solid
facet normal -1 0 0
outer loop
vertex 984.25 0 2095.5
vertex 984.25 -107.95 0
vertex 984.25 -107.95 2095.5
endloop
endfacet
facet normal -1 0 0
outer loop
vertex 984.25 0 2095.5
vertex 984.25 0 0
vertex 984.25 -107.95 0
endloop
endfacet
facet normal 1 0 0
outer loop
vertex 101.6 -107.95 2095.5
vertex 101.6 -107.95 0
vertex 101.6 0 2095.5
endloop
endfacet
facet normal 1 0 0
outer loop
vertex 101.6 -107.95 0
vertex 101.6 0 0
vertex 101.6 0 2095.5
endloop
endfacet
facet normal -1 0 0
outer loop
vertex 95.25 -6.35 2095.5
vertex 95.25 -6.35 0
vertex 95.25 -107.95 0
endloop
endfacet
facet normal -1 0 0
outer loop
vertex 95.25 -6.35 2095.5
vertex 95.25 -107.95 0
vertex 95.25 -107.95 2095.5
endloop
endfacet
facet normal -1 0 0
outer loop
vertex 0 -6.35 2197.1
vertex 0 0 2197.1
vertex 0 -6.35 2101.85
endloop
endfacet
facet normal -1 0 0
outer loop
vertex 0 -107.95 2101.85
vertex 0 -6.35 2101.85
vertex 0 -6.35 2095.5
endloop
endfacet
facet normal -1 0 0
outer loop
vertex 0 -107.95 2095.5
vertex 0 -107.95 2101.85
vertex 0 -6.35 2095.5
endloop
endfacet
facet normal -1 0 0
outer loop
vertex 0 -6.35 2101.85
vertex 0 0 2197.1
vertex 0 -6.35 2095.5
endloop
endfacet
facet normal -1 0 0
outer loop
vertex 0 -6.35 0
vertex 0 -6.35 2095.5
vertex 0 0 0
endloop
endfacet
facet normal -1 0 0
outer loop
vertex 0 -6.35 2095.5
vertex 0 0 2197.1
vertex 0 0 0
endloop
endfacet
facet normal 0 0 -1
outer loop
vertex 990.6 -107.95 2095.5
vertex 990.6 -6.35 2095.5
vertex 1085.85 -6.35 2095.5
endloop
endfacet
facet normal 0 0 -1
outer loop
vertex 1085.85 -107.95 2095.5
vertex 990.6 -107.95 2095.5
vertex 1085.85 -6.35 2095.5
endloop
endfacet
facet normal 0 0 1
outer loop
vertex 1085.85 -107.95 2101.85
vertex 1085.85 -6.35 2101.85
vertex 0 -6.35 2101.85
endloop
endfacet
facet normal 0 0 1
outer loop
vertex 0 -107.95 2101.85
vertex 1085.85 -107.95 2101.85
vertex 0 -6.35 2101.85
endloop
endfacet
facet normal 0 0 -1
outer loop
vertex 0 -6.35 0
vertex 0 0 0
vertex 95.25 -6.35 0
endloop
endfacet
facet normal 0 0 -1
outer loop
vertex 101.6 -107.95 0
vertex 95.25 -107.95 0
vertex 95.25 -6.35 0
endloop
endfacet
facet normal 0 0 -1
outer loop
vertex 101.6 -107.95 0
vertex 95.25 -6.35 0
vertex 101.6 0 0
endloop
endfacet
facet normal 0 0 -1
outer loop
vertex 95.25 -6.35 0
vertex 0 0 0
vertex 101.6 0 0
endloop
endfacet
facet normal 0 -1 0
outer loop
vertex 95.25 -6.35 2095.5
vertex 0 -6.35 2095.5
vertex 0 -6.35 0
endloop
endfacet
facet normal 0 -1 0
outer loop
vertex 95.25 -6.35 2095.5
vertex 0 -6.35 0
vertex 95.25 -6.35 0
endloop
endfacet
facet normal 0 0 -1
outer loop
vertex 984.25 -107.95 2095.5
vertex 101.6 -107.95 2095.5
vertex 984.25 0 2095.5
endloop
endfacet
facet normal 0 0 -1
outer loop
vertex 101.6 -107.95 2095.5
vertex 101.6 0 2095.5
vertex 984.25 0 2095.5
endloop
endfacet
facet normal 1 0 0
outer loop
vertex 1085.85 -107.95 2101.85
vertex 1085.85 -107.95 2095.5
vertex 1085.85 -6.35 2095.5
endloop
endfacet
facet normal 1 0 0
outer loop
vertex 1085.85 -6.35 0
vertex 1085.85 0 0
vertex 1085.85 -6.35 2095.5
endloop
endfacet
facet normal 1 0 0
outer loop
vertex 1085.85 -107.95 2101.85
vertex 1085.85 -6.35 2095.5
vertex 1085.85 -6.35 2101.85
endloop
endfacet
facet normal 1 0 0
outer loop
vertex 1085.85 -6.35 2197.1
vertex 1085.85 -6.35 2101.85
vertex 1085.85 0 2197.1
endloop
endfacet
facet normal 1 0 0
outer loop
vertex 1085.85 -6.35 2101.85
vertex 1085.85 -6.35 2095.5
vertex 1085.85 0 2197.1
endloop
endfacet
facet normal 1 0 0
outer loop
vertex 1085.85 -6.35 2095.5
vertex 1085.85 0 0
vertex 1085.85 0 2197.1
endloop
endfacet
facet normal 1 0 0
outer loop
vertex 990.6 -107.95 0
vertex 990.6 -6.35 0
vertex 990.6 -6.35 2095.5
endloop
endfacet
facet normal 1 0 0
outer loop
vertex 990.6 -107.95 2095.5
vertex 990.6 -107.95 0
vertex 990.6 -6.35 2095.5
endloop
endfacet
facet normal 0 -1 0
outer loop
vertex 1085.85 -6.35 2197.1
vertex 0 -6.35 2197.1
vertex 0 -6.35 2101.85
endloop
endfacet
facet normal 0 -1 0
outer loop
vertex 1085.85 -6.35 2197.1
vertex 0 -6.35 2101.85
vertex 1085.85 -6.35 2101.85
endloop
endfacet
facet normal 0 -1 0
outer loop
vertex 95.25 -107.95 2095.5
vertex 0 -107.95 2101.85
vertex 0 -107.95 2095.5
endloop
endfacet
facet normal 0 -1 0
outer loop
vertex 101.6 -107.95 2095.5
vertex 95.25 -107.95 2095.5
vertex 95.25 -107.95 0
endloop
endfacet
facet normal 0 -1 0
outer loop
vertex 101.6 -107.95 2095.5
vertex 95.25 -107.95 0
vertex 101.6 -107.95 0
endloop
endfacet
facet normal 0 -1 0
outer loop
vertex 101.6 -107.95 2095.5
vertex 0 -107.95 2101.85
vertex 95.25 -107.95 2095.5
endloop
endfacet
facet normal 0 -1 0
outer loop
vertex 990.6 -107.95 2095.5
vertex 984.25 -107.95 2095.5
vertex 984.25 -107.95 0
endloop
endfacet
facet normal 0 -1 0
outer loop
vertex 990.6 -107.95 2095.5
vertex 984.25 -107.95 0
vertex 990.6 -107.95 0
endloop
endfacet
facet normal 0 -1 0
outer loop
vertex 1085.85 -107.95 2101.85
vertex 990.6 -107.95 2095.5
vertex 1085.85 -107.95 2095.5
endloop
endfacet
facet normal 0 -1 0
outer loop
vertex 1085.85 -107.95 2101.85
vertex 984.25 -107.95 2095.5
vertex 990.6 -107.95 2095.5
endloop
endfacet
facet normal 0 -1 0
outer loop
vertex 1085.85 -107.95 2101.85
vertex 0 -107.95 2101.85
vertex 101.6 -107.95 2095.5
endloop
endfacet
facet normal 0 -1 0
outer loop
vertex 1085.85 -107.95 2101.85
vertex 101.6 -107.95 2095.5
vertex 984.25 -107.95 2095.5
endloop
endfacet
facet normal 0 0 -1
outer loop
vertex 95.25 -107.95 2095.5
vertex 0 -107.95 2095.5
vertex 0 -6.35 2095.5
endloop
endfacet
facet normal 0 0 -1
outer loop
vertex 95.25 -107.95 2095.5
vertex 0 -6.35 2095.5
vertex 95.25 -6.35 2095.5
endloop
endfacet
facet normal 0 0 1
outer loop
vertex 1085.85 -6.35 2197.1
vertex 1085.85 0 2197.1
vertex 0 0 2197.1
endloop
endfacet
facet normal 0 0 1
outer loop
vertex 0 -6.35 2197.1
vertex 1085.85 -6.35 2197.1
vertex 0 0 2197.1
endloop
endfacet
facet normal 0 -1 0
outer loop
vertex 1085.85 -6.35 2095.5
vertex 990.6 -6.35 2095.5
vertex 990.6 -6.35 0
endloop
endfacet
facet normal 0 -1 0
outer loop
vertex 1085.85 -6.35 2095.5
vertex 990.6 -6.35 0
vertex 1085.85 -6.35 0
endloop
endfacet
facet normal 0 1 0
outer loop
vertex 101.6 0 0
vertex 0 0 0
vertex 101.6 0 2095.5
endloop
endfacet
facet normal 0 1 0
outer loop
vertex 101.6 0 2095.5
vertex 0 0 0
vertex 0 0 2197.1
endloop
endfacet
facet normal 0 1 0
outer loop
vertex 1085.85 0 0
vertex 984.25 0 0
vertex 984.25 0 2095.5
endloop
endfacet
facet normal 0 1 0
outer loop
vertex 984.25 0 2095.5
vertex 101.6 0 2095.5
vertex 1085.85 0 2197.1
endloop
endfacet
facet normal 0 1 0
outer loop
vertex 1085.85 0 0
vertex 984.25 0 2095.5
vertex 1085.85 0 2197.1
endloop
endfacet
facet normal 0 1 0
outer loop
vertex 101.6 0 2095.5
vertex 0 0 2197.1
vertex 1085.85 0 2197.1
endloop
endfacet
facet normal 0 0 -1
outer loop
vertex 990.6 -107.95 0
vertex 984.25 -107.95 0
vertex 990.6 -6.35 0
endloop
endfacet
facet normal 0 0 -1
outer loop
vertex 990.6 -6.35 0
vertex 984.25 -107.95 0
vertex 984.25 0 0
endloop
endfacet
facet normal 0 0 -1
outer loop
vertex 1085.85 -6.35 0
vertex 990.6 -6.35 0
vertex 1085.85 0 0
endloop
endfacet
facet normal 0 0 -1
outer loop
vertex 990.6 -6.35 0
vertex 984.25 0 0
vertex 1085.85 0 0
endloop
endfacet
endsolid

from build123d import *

# Parameters (mm, degrees)
F0_W     = 101.6
F0_H     = 2095.5
F1_DEPTH = 6.35
F2_W     = 6.35
F2_H     = 2095.5
F3_DEPTH = 101.6


with BuildPart() as f1:
    # F0 (on Front) → F1 (new body)
    with BuildSketch(Plane.XZ):
        Polygon((0, 2197.1), (0, 2095.5), (101.6, 2095.5), (984.25, 2095.5), (1085.85, 2095.5), (1085.85, 2197.1), align=None)
        with Locations((50.8, 1047.75)):
            Rectangle(F0_W, F0_H)
        with Locations((1035.05, 1047.75)):
            Rectangle(F0_W, F0_H)
    extrude(amount=F1_DEPTH)

    # F2 (on face) → F3 (join)
    with BuildSketch(Plane.XZ.offset(6.35)):
        Polygon((0, 2101.85), (0, 2095.5), (95.25, 2095.5), (101.6, 2095.5), (984.25, 2095.5), (990.6, 2095.5), (1085.85, 2095.5), (1085.85, 2101.85), align=None)
        with Locations((98.425, 1047.75)):
            Rectangle(F2_W, F2_H)
        with Locations((987.425, 1047.75)):
            Rectangle(F2_W, F2_H)
    extrude(amount=F3_DEPTH)


solid = f1.part
